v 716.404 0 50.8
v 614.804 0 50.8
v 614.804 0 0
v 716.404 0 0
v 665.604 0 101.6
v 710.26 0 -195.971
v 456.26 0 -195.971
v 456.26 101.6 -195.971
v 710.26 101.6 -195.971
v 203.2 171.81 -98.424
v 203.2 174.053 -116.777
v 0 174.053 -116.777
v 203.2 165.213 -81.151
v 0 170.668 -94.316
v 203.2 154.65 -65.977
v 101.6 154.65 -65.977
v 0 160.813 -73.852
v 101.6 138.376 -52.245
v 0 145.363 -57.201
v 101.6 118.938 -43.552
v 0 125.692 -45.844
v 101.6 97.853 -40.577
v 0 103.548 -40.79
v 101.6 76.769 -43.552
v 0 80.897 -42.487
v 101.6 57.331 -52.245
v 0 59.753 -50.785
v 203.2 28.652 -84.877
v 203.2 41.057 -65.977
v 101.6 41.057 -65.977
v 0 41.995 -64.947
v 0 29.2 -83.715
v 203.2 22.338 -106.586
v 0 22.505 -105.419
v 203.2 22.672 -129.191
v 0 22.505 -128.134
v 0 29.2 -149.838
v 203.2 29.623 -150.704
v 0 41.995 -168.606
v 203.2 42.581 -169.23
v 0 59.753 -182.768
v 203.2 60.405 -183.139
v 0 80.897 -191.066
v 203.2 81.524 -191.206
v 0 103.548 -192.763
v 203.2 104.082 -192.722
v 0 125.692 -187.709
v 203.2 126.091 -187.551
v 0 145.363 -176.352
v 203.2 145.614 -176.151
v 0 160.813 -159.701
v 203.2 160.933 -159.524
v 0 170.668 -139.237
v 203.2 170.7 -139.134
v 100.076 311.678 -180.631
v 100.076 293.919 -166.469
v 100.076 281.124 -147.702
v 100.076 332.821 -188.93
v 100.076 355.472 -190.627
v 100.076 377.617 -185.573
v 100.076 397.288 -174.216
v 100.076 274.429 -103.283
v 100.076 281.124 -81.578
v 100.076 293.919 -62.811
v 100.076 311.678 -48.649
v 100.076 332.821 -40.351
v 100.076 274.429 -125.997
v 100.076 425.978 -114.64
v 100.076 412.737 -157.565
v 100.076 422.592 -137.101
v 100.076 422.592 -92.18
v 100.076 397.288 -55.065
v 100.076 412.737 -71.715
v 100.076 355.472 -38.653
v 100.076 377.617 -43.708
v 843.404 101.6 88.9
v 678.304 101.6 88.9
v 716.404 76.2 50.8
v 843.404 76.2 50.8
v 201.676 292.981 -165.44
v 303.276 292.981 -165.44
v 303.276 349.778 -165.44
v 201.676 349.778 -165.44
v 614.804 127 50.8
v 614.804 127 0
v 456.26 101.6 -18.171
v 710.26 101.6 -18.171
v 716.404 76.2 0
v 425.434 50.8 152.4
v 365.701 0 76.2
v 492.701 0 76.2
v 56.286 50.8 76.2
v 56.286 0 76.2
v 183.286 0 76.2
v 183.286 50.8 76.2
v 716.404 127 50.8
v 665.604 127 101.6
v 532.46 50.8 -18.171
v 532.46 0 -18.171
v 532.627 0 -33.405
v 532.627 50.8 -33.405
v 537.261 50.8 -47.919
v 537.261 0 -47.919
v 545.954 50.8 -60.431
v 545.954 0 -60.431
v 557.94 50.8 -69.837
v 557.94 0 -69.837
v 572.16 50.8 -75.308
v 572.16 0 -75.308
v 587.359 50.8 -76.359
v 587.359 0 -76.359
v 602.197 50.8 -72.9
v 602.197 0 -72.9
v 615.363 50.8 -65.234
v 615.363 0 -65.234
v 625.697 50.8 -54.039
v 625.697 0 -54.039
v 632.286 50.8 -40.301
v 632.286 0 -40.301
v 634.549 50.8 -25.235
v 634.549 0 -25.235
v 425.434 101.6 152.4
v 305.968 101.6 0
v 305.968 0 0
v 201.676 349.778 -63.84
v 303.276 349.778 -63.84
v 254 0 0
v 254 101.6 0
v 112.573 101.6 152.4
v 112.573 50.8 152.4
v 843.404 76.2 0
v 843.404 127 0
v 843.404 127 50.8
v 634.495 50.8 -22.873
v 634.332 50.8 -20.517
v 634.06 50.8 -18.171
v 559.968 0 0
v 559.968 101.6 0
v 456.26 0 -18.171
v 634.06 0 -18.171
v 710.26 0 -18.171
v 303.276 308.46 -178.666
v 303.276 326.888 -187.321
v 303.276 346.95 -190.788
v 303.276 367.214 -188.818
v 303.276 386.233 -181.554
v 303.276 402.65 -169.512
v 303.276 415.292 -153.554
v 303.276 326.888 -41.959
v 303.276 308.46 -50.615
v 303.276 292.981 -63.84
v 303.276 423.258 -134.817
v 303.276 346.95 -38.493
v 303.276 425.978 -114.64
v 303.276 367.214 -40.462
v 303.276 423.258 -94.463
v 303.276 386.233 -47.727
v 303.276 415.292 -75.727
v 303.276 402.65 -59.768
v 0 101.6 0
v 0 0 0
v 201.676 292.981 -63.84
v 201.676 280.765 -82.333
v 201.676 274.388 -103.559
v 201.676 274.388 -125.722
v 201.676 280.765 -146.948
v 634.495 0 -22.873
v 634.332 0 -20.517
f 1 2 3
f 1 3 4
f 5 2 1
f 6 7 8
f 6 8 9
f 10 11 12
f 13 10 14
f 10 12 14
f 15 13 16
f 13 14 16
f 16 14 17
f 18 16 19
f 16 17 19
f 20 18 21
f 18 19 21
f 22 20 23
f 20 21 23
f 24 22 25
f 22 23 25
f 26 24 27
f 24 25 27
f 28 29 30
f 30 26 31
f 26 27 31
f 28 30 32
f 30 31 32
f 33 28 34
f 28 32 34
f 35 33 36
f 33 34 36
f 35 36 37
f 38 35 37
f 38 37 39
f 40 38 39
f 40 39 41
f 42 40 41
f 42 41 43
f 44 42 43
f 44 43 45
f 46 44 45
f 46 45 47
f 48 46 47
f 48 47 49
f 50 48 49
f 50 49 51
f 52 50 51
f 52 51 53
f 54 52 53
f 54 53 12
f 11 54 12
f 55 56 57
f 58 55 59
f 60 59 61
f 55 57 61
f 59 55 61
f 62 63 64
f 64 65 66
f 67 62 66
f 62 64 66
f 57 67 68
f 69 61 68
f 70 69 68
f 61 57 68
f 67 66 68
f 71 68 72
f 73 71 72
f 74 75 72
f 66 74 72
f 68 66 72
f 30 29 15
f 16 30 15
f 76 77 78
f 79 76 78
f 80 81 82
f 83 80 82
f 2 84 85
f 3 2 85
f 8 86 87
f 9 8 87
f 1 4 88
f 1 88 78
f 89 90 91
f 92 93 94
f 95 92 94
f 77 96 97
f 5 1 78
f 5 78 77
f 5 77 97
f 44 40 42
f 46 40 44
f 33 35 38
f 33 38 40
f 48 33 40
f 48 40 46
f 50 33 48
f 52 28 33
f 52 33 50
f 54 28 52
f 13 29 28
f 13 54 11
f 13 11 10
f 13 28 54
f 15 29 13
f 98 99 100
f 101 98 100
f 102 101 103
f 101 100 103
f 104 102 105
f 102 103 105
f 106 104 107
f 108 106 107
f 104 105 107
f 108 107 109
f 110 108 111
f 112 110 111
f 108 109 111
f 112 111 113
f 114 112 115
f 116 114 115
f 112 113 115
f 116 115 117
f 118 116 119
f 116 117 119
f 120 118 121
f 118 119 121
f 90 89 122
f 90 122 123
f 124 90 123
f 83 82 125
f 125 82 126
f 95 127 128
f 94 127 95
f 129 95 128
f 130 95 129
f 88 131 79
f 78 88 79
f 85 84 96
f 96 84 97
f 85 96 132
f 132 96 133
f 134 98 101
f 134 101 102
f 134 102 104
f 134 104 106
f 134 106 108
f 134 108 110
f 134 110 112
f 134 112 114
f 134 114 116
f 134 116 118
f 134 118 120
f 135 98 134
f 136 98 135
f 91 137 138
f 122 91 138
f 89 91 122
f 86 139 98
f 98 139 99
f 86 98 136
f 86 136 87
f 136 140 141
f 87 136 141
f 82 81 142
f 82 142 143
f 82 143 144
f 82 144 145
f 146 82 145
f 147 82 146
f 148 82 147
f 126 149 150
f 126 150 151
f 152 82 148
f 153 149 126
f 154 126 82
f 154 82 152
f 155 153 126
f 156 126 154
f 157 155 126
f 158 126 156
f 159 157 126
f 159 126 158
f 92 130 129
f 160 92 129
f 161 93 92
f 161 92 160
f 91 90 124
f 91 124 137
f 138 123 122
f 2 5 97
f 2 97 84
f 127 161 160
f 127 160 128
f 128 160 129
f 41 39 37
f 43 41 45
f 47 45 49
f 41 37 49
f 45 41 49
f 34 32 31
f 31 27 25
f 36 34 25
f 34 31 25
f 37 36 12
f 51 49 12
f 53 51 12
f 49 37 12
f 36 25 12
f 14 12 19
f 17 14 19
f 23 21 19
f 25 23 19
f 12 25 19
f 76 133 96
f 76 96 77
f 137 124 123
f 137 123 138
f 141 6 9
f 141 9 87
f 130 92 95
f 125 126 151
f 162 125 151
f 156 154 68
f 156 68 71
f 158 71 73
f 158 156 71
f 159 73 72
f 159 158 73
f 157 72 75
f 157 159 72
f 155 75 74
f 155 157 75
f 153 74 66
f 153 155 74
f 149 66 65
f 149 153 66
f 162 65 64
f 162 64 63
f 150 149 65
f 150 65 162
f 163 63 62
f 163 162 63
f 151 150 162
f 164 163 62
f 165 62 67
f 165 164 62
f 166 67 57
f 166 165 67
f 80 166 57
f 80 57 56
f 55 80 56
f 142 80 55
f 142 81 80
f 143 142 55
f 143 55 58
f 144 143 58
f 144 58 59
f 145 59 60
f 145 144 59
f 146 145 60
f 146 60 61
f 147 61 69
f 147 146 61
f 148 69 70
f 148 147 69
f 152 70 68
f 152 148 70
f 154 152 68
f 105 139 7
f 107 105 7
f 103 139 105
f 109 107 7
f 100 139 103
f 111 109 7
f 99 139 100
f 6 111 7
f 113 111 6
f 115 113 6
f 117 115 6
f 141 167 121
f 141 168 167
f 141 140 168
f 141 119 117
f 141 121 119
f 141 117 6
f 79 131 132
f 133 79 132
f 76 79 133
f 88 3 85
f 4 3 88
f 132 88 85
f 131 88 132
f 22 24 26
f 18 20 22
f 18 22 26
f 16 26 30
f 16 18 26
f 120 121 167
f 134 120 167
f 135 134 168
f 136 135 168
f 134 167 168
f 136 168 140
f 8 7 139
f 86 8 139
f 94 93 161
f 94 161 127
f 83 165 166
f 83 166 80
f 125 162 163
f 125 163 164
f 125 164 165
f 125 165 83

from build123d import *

# Parameters (mm, degrees)
F1_DEPTH  = 101.6
F3_DEPTH  = 50.8
F5_DEPTH  = 50.8
F7_DEPTH  = 101.6
F10_DEPTH = 279.4
F12_DEPTH = 127
F14_W     = 50.8
F14_H     = 50.8
F16_R     = 76.2
F17_DEPTH = 203.2
F19_DEPTH = 101.6
F20_R     = 76.2
F21_DEPTH = 203.2
F23_DEPTH = 101.6
F24_W     = 254
F24_H     = 177.8
F25_DEPTH = 101.6
F27_DEPTH = 50.8


with BuildPart() as f1:
    # F0 (on Front) → F1 (new body)
    with BuildSketch(Plane.XZ):
        Polygon((112.5727180381, 152.4), (0, 0), (254, 0), align=None)
    extrude(amount=-F1_DEPTH)

    # F2 (on face) → F3 (join)
    with BuildSketch(Plane.XZ):
        Polygon((183.286359019, 76.2), (112.5727180381, 152.4), (56.286359019, 76.2), align=None)
    extrude(amount=-F3_DEPTH)

    # F4 (on face) → F5 (cut)
    with BuildSketch(Plane.XZ):
        Polygon((183.286359019, 76.2), (112.5727180381, 152.4), (56.286359019, 76.2), align=None)
    extrude(amount=-F5_DEPTH, mode=Mode.SUBTRACT)


with BuildPart() as f7:
    # F6 (on Front) → F7 (new body)
    with BuildSketch(Plane.XZ):
        Polygon((425.4340355222, 152.4), (305.9679370656, 0), (559.9679370656, 0), align=None)
    extrude(amount=-F7_DEPTH)

    # F9 (on offset) → F10 (cut)
    with BuildSketch(Plane.YZ.offset(303.276)):
        Polygon((0, 152.4), (0, 76.2), (50.8, 152.4), align=None)
    extrude(amount=F10_DEPTH, mode=Mode.SUBTRACT)


with BuildPart() as f12:
    # F11 (on Front) → F12 (new body)
    with BuildSketch(Plane.XZ):
        Polygon((614.8042158089, 50.8), (614.8042158089, 0), (716.4042158089, 0), (716.4042158089, 50.8), (665.6042158089, 101.6), align=None)
    extrude(amount=-F12_DEPTH)

    # F14 (on offset) → F15 (join, up to the next surface of F12)
    with BuildSketch(Plane.YZ.offset(843.4042158089)):
        with Locations((101.6, 25.4)):
            Rectangle(F14_W, F14_H)
        Polygon((76.2, 50.8), (127, 50.8), (101.6, 88.9), align=None)
    extrude(until=Until.NEXT, dir=(-1, 0, 0))


with BuildPart() as f17:
    # F16 (on Right) → F17 (new body)
    with BuildSketch(Plane.YZ):
        with Locations((97.8534966707, -116.7765036225)):
            Circle(F16_R)
    extrude(amount=F17_DEPTH)

    # F18 (on face) → F19 (cut)
    with BuildSketch(Plane.YZ.offset(203.2)):
        with BuildLine():
            ThreePointArc((154.6496232992, -65.9765036225), (97.8534966707, -40.5765036225), (41.0573700422, -65.9765036225))
            Line((41.0573700422, -65.9765036225), (154.6496232992, -65.9765036225))
        make_face()
    extrude(amount=-F19_DEPTH, mode=Mode.SUBTRACT)


with BuildPart() as f21:
    # F20 (on offset) → F21 (new body)
    with BuildSketch(Plane.YZ.offset(303.276)):
        with Locations((349.7775793076, -114.6402806044)):
            Circle(F20_R)
    extrude(amount=-F21_DEPTH)

    # F22 (on face) → F23 (cut)
    with BuildSketch(Plane.YZ.offset(303.276)):
        with BuildLine():
            Line((349.7775793076, -63.8402806044), (292.9814526791, -63.8402806044))
            ThreePointArc((292.9814526791, -63.8402806044), (273.5775793076, -114.6402806044), (292.9814526791, -165.4402806044))
            Line((292.9814526791, -165.4402806044), (349.7775793076, -165.4402806044))
            Line((349.7775793076, -165.4402806044), (349.7775793076, -63.8402806044))
        make_face()
    extrude(amount=-F23_DEPTH, mode=Mode.SUBTRACT)


with BuildPart() as f25:
    # F24 (on Front) → F25 (new body)
    with BuildSketch(Plane.XZ):
        with Locations((583.2604467869, -107.0706863395)):
            Rectangle(F24_W, F24_H)
    extrude(amount=-F25_DEPTH)

    # F26 (on face) → F27 (cut)
    with BuildSketch(Plane.XZ):
        with BuildLine():
            ThreePointArc((532.4604467869, -18.1706863395), (579.7200140613, -76.4011061392), (634.5492344713, -25.2346612925))
            ThreePointArc((634.5492344713, -25.2346612925), (634.4268916336, -21.6942285669), (634.0604467869, -18.1706863395))
            Line((634.0604467869, -18.1706863395), (532.4604467869, -18.1706863395))
        make_face()
    extrude(amount=-F27_DEPTH, mode=Mode.SUBTRACT)


solid = Compound([f1.part, f7.part, f12.part, f17.part, f21.part, f25.part])
